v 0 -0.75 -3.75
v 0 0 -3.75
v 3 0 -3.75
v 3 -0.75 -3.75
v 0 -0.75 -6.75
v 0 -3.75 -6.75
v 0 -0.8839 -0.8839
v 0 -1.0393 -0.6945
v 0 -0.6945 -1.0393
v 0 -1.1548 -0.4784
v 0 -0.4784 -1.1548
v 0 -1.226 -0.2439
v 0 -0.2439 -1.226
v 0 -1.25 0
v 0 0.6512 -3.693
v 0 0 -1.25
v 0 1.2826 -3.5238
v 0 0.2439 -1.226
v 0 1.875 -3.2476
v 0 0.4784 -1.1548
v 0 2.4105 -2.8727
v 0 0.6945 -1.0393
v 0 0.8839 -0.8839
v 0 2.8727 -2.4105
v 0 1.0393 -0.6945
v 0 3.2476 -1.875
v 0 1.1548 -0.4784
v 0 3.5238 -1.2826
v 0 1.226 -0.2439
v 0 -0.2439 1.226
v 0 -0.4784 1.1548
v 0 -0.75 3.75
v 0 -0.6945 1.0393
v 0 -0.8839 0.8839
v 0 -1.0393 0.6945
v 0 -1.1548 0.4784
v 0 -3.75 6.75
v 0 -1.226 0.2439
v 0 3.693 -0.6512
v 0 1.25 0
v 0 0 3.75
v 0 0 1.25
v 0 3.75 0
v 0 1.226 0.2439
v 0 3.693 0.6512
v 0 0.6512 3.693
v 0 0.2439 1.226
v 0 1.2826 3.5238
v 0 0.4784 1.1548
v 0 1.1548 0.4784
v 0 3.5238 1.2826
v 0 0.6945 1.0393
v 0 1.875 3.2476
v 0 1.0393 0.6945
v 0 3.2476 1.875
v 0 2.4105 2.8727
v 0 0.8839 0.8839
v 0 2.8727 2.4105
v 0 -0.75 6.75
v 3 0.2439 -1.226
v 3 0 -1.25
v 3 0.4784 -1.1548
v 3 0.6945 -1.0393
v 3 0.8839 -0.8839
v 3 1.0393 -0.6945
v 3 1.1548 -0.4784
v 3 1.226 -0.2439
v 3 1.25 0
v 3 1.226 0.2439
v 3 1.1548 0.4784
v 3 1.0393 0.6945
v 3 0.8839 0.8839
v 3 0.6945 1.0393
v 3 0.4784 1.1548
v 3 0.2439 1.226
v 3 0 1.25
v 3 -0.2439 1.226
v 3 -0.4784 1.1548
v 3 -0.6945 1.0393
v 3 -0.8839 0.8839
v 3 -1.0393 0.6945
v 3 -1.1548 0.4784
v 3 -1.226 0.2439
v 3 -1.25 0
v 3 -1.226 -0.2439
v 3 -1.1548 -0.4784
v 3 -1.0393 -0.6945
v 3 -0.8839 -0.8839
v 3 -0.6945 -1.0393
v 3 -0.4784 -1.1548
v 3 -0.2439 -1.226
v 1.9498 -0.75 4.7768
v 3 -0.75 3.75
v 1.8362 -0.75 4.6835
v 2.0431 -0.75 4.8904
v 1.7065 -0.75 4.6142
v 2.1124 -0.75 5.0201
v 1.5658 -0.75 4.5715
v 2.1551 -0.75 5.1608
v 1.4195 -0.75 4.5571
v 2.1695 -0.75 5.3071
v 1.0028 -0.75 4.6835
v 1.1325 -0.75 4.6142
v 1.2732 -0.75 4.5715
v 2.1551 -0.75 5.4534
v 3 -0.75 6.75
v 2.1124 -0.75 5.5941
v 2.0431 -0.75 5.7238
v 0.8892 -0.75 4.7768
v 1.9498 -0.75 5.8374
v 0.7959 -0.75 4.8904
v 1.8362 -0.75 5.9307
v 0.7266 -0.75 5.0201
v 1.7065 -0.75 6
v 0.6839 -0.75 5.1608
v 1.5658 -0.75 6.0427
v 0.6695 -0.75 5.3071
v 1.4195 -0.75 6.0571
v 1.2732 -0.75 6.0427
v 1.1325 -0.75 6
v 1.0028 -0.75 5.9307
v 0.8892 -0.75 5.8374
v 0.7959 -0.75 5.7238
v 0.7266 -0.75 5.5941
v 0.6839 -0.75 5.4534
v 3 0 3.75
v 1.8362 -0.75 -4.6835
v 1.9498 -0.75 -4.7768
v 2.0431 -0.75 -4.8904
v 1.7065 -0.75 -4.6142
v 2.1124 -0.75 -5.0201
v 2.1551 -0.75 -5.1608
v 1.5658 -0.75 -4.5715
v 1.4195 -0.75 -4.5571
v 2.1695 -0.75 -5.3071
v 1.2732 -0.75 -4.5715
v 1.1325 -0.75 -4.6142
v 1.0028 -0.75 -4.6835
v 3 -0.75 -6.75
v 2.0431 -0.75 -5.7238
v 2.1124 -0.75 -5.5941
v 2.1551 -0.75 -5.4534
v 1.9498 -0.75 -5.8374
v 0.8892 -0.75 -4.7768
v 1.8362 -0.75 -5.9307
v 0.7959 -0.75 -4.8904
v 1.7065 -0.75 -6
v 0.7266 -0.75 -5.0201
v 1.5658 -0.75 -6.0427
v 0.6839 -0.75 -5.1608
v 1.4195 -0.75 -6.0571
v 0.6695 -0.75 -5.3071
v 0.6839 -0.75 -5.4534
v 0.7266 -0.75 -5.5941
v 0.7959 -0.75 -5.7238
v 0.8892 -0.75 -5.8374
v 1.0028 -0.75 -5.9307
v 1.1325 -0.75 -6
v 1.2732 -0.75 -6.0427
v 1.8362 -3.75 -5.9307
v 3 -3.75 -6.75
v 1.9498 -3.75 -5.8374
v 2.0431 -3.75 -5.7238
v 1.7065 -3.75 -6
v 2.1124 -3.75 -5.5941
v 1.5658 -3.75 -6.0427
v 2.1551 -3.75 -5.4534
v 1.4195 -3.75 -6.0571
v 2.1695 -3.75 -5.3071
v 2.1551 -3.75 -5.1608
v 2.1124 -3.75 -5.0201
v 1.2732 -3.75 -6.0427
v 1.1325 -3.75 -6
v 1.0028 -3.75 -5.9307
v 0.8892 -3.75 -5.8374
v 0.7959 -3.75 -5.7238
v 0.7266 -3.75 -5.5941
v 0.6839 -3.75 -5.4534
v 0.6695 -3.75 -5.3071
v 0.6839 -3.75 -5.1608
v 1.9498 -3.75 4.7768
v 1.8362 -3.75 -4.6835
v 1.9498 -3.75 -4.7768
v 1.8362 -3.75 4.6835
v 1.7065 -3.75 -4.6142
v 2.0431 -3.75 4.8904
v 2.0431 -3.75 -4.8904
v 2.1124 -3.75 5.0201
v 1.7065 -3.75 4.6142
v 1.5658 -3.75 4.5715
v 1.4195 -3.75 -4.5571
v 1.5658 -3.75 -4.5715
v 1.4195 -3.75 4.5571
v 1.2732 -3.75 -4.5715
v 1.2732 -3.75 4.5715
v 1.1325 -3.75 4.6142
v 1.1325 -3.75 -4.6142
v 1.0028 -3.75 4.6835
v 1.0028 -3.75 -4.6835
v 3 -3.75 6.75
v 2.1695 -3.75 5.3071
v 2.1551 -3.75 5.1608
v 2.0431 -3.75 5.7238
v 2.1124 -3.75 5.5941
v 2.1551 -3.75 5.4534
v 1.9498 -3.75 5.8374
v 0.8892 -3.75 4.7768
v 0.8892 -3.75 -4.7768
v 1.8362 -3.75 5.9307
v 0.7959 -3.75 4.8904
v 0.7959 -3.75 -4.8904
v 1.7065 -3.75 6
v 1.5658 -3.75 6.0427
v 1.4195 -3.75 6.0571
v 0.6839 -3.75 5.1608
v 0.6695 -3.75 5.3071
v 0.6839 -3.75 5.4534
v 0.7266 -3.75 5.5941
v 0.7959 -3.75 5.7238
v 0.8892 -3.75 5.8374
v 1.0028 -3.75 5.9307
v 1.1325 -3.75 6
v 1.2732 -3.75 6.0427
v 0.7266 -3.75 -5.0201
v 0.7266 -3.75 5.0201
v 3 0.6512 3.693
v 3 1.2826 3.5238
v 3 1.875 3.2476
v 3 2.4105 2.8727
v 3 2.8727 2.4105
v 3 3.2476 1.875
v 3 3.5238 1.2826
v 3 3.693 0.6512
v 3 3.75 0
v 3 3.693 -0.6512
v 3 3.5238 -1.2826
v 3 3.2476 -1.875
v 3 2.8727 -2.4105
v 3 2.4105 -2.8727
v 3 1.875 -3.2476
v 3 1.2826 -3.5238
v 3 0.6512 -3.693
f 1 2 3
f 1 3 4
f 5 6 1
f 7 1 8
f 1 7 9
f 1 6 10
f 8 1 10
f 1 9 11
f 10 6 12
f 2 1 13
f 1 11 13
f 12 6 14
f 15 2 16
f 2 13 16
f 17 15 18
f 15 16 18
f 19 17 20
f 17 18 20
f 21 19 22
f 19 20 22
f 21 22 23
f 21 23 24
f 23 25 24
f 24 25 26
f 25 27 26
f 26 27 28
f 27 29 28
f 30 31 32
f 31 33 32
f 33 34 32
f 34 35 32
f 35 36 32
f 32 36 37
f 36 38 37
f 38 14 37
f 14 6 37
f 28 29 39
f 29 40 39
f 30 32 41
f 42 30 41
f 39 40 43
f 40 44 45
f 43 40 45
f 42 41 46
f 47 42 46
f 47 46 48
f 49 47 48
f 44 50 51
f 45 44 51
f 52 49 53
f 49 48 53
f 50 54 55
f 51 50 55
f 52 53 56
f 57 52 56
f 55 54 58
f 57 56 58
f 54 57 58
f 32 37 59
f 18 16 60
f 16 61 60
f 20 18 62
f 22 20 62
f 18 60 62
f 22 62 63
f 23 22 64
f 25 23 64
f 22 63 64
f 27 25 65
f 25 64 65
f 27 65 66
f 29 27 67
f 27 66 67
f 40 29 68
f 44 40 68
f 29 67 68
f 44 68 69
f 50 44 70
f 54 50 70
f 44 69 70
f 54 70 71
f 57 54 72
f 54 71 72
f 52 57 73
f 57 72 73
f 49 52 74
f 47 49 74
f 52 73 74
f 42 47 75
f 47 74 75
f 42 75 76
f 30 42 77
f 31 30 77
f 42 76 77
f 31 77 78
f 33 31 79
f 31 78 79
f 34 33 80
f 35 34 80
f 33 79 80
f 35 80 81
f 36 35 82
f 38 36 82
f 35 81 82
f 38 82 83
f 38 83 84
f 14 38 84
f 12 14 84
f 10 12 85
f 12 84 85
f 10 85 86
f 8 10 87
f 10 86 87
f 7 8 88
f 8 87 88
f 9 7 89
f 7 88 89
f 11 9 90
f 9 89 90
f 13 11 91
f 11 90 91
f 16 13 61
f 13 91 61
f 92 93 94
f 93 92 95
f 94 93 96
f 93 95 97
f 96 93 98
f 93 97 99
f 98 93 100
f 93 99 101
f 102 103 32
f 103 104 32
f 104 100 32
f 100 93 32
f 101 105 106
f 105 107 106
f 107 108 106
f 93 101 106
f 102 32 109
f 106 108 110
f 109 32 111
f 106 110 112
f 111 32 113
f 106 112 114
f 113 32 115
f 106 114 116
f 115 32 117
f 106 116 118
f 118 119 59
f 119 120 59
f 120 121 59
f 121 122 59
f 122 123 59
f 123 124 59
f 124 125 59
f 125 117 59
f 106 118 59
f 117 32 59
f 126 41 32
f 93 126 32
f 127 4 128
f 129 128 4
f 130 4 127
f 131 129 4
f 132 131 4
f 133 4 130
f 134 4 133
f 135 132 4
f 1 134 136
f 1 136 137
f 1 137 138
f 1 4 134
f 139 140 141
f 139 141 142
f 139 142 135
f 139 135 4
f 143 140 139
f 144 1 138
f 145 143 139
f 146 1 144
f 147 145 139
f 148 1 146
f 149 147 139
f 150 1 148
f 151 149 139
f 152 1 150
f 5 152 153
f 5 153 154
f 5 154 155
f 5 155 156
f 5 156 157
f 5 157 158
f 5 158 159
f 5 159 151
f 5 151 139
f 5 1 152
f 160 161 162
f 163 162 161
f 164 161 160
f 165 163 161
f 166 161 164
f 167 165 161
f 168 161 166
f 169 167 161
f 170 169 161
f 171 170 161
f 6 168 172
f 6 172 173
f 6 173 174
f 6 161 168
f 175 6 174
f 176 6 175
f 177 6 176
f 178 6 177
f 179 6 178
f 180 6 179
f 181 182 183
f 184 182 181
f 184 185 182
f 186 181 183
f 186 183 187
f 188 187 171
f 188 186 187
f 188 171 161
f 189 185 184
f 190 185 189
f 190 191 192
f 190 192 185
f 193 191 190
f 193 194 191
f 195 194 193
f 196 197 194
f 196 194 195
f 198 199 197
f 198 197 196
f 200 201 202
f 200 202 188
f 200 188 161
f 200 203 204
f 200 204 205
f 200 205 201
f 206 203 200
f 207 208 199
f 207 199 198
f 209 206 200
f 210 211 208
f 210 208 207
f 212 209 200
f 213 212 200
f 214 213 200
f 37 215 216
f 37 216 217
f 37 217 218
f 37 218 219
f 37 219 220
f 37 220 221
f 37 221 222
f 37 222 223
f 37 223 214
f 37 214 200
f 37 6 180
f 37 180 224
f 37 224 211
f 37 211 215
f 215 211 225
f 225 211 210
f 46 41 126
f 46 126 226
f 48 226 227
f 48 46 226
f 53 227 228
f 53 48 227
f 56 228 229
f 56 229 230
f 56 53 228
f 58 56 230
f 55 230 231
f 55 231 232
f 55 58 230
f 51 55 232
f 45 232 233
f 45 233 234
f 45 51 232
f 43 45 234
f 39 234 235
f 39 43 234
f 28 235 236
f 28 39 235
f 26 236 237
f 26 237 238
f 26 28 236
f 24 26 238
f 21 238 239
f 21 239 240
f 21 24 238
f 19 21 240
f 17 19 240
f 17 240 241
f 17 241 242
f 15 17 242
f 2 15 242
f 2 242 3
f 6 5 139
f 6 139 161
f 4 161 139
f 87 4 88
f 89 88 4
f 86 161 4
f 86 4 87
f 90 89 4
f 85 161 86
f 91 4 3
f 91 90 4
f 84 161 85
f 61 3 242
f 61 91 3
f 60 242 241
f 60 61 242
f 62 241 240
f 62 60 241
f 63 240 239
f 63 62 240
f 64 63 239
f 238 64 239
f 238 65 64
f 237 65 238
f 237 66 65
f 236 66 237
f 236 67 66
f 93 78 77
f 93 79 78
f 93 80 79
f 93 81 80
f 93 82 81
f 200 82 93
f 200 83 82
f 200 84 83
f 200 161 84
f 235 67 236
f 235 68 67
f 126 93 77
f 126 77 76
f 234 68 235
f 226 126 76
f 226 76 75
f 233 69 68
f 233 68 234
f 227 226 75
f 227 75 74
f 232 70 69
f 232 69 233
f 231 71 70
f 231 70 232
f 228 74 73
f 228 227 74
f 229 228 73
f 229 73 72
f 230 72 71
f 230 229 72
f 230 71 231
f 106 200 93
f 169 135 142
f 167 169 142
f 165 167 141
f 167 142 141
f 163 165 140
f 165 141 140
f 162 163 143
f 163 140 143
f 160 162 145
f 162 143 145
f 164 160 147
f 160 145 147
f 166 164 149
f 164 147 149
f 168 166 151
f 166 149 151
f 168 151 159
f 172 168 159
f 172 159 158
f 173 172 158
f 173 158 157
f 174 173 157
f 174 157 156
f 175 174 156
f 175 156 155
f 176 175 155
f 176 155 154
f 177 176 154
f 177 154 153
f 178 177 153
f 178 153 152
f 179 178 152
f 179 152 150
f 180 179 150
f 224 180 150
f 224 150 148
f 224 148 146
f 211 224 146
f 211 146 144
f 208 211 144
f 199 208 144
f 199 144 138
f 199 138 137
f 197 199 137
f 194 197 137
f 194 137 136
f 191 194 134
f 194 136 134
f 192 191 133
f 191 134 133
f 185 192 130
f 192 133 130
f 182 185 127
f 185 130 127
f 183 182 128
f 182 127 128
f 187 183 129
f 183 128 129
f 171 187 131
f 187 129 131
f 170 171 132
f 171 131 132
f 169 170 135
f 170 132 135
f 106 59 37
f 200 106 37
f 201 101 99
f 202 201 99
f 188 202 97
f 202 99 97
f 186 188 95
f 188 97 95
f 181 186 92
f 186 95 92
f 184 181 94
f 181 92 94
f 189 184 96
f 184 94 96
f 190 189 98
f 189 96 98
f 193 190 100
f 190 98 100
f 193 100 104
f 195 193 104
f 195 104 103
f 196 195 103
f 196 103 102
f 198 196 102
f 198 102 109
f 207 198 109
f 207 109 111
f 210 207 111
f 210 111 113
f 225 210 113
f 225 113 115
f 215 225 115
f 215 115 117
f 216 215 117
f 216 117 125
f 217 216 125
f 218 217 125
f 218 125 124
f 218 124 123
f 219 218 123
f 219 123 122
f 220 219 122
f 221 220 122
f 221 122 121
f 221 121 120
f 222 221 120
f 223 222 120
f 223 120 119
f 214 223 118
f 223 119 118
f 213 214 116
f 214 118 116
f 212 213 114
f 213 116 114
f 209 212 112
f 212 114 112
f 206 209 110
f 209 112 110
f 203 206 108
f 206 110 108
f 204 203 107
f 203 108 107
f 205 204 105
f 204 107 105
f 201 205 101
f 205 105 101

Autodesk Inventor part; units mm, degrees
ref_plane "YZ Plane" through (0, 0, 0) normal (1, 0, 0) x (0, 1, 0)
ref_plane "XZ Plane" through (0, 0, 0) normal (0, 1, 0) x (-1, 0, 0)
ref_plane "XY Plane" through (0, 0, 0) normal (0, 0, 1) x (1, 0, 0)
sketch "Sketch1" plane through (0, 0, 0) normal (1, 0, 0) x (0, 1, 0)
  circle A0 centre (0, 0) radius 1.25
  circle A1 centre (0, 0) radius 3.75
  line L0 (0, -3.75) -> (-3.5355, -3.75)
  line L1 (-3.5355, -3.75) -> (-3.5355, -1.25)
  line L2 (-3.5355, -1.25) -> (0, -1.25)
  line L3 (0, -1.25) -> (0, -3.75)
  line L4 (0, 3.75) -> (-2.9201, 3.75)
  line L5 (-2.9201, 3.75) -> (-2.9201, 1.25)
  line L6 (-2.9201, 1.25) -> (0, 1.25)
  line L7 (0, 1.25) -> (0, 3.75)
  line L8 (-3.75, 0) -> (-1.25, 0)
  line L9 (-1.25, 0) -> (-1.25, -3.75)
  line L10 (-1.25, -3.75) -> (-3.75, -3.75)
  line L11 (-3.75, -3.75) -> (-3.75, 0)
  line L12 (-3.75, 0) -> (-1.25, 0)
  line L13 (-1.25, 0) -> (-1.25, 3.75)
  line L14 (-1.25, 3.75) -> (-3.75, 3.75)
  line L15 (-3.75, 3.75) -> (-3.75, 0)
  line L16 (-3.75, 3.75) -> (-0.75, 3.75)
  line L17 (-0.75, 3.75) -> (-0.75, 6.75)
  line L18 (-0.75, 6.75) -> (-3.75, 6.75)
  line L19 (-3.75, 6.75) -> (-3.75, 3.75)
  line L20 (0, -3.75) -> (-2.9201, -3.75)
  line L21 (-0.75, -3.75) -> (-0.75, -6.75)
  line L22 (-0.75, -6.75) -> (-3.75, -6.75)
  line L23 (-3.75, -6.75) -> (-3.75, -3.75)
  line L24 (-0.75, -6.75) -> (-3.75, -6.75)
  line L25 (-3.75, -6.75) -> (-3.75, -3.75)
  line L26 (-3.75, -3.75) -> (-0.75, -3.75)
  line L27 (-0.75, -3.75) -> (-0.75, -6.75)
  dimension "d0" = 2.5
  dimension "d1" = 7.5
  dimension "d2" = 3
  dimension "d3" = 3
extrude "Extrusion1" add sketch "Sketch1" along normal blind 3
sketch "Sketch2" plane through (3, 0, 0) normal (1, 0, 0) x (0, 0, -1)
  circle A0 centre (0, 0) radius 1.25
  dimension "d6" = 2.5
extrude "Extrusion2" cut sketch "Sketch2" against normal blind 10
sketch "Sketch3" plane through (0, -0.75, 6.75) normal (0, 1, 0) x (1, 0, 0)
  line L0 (0, 0) -> (3, 3.0493)
  line L1 (3, 0) -> (3, 13.5) projected
  line L2 (0, 6.75) -> (4.6316, 6.75)
  circle A0 centre (1.4195, 1.4429) radius 0.75
  line L3 (0, 13.5) -> (3, 10.4507)
  circle A1 centre (1.4195, 12.0571) radius 0.75
  dimension "d9" = 1.5
extrude "Extrusion3" cut sketch "Sketch3" against normal blind 10
properties part number "attachment"
